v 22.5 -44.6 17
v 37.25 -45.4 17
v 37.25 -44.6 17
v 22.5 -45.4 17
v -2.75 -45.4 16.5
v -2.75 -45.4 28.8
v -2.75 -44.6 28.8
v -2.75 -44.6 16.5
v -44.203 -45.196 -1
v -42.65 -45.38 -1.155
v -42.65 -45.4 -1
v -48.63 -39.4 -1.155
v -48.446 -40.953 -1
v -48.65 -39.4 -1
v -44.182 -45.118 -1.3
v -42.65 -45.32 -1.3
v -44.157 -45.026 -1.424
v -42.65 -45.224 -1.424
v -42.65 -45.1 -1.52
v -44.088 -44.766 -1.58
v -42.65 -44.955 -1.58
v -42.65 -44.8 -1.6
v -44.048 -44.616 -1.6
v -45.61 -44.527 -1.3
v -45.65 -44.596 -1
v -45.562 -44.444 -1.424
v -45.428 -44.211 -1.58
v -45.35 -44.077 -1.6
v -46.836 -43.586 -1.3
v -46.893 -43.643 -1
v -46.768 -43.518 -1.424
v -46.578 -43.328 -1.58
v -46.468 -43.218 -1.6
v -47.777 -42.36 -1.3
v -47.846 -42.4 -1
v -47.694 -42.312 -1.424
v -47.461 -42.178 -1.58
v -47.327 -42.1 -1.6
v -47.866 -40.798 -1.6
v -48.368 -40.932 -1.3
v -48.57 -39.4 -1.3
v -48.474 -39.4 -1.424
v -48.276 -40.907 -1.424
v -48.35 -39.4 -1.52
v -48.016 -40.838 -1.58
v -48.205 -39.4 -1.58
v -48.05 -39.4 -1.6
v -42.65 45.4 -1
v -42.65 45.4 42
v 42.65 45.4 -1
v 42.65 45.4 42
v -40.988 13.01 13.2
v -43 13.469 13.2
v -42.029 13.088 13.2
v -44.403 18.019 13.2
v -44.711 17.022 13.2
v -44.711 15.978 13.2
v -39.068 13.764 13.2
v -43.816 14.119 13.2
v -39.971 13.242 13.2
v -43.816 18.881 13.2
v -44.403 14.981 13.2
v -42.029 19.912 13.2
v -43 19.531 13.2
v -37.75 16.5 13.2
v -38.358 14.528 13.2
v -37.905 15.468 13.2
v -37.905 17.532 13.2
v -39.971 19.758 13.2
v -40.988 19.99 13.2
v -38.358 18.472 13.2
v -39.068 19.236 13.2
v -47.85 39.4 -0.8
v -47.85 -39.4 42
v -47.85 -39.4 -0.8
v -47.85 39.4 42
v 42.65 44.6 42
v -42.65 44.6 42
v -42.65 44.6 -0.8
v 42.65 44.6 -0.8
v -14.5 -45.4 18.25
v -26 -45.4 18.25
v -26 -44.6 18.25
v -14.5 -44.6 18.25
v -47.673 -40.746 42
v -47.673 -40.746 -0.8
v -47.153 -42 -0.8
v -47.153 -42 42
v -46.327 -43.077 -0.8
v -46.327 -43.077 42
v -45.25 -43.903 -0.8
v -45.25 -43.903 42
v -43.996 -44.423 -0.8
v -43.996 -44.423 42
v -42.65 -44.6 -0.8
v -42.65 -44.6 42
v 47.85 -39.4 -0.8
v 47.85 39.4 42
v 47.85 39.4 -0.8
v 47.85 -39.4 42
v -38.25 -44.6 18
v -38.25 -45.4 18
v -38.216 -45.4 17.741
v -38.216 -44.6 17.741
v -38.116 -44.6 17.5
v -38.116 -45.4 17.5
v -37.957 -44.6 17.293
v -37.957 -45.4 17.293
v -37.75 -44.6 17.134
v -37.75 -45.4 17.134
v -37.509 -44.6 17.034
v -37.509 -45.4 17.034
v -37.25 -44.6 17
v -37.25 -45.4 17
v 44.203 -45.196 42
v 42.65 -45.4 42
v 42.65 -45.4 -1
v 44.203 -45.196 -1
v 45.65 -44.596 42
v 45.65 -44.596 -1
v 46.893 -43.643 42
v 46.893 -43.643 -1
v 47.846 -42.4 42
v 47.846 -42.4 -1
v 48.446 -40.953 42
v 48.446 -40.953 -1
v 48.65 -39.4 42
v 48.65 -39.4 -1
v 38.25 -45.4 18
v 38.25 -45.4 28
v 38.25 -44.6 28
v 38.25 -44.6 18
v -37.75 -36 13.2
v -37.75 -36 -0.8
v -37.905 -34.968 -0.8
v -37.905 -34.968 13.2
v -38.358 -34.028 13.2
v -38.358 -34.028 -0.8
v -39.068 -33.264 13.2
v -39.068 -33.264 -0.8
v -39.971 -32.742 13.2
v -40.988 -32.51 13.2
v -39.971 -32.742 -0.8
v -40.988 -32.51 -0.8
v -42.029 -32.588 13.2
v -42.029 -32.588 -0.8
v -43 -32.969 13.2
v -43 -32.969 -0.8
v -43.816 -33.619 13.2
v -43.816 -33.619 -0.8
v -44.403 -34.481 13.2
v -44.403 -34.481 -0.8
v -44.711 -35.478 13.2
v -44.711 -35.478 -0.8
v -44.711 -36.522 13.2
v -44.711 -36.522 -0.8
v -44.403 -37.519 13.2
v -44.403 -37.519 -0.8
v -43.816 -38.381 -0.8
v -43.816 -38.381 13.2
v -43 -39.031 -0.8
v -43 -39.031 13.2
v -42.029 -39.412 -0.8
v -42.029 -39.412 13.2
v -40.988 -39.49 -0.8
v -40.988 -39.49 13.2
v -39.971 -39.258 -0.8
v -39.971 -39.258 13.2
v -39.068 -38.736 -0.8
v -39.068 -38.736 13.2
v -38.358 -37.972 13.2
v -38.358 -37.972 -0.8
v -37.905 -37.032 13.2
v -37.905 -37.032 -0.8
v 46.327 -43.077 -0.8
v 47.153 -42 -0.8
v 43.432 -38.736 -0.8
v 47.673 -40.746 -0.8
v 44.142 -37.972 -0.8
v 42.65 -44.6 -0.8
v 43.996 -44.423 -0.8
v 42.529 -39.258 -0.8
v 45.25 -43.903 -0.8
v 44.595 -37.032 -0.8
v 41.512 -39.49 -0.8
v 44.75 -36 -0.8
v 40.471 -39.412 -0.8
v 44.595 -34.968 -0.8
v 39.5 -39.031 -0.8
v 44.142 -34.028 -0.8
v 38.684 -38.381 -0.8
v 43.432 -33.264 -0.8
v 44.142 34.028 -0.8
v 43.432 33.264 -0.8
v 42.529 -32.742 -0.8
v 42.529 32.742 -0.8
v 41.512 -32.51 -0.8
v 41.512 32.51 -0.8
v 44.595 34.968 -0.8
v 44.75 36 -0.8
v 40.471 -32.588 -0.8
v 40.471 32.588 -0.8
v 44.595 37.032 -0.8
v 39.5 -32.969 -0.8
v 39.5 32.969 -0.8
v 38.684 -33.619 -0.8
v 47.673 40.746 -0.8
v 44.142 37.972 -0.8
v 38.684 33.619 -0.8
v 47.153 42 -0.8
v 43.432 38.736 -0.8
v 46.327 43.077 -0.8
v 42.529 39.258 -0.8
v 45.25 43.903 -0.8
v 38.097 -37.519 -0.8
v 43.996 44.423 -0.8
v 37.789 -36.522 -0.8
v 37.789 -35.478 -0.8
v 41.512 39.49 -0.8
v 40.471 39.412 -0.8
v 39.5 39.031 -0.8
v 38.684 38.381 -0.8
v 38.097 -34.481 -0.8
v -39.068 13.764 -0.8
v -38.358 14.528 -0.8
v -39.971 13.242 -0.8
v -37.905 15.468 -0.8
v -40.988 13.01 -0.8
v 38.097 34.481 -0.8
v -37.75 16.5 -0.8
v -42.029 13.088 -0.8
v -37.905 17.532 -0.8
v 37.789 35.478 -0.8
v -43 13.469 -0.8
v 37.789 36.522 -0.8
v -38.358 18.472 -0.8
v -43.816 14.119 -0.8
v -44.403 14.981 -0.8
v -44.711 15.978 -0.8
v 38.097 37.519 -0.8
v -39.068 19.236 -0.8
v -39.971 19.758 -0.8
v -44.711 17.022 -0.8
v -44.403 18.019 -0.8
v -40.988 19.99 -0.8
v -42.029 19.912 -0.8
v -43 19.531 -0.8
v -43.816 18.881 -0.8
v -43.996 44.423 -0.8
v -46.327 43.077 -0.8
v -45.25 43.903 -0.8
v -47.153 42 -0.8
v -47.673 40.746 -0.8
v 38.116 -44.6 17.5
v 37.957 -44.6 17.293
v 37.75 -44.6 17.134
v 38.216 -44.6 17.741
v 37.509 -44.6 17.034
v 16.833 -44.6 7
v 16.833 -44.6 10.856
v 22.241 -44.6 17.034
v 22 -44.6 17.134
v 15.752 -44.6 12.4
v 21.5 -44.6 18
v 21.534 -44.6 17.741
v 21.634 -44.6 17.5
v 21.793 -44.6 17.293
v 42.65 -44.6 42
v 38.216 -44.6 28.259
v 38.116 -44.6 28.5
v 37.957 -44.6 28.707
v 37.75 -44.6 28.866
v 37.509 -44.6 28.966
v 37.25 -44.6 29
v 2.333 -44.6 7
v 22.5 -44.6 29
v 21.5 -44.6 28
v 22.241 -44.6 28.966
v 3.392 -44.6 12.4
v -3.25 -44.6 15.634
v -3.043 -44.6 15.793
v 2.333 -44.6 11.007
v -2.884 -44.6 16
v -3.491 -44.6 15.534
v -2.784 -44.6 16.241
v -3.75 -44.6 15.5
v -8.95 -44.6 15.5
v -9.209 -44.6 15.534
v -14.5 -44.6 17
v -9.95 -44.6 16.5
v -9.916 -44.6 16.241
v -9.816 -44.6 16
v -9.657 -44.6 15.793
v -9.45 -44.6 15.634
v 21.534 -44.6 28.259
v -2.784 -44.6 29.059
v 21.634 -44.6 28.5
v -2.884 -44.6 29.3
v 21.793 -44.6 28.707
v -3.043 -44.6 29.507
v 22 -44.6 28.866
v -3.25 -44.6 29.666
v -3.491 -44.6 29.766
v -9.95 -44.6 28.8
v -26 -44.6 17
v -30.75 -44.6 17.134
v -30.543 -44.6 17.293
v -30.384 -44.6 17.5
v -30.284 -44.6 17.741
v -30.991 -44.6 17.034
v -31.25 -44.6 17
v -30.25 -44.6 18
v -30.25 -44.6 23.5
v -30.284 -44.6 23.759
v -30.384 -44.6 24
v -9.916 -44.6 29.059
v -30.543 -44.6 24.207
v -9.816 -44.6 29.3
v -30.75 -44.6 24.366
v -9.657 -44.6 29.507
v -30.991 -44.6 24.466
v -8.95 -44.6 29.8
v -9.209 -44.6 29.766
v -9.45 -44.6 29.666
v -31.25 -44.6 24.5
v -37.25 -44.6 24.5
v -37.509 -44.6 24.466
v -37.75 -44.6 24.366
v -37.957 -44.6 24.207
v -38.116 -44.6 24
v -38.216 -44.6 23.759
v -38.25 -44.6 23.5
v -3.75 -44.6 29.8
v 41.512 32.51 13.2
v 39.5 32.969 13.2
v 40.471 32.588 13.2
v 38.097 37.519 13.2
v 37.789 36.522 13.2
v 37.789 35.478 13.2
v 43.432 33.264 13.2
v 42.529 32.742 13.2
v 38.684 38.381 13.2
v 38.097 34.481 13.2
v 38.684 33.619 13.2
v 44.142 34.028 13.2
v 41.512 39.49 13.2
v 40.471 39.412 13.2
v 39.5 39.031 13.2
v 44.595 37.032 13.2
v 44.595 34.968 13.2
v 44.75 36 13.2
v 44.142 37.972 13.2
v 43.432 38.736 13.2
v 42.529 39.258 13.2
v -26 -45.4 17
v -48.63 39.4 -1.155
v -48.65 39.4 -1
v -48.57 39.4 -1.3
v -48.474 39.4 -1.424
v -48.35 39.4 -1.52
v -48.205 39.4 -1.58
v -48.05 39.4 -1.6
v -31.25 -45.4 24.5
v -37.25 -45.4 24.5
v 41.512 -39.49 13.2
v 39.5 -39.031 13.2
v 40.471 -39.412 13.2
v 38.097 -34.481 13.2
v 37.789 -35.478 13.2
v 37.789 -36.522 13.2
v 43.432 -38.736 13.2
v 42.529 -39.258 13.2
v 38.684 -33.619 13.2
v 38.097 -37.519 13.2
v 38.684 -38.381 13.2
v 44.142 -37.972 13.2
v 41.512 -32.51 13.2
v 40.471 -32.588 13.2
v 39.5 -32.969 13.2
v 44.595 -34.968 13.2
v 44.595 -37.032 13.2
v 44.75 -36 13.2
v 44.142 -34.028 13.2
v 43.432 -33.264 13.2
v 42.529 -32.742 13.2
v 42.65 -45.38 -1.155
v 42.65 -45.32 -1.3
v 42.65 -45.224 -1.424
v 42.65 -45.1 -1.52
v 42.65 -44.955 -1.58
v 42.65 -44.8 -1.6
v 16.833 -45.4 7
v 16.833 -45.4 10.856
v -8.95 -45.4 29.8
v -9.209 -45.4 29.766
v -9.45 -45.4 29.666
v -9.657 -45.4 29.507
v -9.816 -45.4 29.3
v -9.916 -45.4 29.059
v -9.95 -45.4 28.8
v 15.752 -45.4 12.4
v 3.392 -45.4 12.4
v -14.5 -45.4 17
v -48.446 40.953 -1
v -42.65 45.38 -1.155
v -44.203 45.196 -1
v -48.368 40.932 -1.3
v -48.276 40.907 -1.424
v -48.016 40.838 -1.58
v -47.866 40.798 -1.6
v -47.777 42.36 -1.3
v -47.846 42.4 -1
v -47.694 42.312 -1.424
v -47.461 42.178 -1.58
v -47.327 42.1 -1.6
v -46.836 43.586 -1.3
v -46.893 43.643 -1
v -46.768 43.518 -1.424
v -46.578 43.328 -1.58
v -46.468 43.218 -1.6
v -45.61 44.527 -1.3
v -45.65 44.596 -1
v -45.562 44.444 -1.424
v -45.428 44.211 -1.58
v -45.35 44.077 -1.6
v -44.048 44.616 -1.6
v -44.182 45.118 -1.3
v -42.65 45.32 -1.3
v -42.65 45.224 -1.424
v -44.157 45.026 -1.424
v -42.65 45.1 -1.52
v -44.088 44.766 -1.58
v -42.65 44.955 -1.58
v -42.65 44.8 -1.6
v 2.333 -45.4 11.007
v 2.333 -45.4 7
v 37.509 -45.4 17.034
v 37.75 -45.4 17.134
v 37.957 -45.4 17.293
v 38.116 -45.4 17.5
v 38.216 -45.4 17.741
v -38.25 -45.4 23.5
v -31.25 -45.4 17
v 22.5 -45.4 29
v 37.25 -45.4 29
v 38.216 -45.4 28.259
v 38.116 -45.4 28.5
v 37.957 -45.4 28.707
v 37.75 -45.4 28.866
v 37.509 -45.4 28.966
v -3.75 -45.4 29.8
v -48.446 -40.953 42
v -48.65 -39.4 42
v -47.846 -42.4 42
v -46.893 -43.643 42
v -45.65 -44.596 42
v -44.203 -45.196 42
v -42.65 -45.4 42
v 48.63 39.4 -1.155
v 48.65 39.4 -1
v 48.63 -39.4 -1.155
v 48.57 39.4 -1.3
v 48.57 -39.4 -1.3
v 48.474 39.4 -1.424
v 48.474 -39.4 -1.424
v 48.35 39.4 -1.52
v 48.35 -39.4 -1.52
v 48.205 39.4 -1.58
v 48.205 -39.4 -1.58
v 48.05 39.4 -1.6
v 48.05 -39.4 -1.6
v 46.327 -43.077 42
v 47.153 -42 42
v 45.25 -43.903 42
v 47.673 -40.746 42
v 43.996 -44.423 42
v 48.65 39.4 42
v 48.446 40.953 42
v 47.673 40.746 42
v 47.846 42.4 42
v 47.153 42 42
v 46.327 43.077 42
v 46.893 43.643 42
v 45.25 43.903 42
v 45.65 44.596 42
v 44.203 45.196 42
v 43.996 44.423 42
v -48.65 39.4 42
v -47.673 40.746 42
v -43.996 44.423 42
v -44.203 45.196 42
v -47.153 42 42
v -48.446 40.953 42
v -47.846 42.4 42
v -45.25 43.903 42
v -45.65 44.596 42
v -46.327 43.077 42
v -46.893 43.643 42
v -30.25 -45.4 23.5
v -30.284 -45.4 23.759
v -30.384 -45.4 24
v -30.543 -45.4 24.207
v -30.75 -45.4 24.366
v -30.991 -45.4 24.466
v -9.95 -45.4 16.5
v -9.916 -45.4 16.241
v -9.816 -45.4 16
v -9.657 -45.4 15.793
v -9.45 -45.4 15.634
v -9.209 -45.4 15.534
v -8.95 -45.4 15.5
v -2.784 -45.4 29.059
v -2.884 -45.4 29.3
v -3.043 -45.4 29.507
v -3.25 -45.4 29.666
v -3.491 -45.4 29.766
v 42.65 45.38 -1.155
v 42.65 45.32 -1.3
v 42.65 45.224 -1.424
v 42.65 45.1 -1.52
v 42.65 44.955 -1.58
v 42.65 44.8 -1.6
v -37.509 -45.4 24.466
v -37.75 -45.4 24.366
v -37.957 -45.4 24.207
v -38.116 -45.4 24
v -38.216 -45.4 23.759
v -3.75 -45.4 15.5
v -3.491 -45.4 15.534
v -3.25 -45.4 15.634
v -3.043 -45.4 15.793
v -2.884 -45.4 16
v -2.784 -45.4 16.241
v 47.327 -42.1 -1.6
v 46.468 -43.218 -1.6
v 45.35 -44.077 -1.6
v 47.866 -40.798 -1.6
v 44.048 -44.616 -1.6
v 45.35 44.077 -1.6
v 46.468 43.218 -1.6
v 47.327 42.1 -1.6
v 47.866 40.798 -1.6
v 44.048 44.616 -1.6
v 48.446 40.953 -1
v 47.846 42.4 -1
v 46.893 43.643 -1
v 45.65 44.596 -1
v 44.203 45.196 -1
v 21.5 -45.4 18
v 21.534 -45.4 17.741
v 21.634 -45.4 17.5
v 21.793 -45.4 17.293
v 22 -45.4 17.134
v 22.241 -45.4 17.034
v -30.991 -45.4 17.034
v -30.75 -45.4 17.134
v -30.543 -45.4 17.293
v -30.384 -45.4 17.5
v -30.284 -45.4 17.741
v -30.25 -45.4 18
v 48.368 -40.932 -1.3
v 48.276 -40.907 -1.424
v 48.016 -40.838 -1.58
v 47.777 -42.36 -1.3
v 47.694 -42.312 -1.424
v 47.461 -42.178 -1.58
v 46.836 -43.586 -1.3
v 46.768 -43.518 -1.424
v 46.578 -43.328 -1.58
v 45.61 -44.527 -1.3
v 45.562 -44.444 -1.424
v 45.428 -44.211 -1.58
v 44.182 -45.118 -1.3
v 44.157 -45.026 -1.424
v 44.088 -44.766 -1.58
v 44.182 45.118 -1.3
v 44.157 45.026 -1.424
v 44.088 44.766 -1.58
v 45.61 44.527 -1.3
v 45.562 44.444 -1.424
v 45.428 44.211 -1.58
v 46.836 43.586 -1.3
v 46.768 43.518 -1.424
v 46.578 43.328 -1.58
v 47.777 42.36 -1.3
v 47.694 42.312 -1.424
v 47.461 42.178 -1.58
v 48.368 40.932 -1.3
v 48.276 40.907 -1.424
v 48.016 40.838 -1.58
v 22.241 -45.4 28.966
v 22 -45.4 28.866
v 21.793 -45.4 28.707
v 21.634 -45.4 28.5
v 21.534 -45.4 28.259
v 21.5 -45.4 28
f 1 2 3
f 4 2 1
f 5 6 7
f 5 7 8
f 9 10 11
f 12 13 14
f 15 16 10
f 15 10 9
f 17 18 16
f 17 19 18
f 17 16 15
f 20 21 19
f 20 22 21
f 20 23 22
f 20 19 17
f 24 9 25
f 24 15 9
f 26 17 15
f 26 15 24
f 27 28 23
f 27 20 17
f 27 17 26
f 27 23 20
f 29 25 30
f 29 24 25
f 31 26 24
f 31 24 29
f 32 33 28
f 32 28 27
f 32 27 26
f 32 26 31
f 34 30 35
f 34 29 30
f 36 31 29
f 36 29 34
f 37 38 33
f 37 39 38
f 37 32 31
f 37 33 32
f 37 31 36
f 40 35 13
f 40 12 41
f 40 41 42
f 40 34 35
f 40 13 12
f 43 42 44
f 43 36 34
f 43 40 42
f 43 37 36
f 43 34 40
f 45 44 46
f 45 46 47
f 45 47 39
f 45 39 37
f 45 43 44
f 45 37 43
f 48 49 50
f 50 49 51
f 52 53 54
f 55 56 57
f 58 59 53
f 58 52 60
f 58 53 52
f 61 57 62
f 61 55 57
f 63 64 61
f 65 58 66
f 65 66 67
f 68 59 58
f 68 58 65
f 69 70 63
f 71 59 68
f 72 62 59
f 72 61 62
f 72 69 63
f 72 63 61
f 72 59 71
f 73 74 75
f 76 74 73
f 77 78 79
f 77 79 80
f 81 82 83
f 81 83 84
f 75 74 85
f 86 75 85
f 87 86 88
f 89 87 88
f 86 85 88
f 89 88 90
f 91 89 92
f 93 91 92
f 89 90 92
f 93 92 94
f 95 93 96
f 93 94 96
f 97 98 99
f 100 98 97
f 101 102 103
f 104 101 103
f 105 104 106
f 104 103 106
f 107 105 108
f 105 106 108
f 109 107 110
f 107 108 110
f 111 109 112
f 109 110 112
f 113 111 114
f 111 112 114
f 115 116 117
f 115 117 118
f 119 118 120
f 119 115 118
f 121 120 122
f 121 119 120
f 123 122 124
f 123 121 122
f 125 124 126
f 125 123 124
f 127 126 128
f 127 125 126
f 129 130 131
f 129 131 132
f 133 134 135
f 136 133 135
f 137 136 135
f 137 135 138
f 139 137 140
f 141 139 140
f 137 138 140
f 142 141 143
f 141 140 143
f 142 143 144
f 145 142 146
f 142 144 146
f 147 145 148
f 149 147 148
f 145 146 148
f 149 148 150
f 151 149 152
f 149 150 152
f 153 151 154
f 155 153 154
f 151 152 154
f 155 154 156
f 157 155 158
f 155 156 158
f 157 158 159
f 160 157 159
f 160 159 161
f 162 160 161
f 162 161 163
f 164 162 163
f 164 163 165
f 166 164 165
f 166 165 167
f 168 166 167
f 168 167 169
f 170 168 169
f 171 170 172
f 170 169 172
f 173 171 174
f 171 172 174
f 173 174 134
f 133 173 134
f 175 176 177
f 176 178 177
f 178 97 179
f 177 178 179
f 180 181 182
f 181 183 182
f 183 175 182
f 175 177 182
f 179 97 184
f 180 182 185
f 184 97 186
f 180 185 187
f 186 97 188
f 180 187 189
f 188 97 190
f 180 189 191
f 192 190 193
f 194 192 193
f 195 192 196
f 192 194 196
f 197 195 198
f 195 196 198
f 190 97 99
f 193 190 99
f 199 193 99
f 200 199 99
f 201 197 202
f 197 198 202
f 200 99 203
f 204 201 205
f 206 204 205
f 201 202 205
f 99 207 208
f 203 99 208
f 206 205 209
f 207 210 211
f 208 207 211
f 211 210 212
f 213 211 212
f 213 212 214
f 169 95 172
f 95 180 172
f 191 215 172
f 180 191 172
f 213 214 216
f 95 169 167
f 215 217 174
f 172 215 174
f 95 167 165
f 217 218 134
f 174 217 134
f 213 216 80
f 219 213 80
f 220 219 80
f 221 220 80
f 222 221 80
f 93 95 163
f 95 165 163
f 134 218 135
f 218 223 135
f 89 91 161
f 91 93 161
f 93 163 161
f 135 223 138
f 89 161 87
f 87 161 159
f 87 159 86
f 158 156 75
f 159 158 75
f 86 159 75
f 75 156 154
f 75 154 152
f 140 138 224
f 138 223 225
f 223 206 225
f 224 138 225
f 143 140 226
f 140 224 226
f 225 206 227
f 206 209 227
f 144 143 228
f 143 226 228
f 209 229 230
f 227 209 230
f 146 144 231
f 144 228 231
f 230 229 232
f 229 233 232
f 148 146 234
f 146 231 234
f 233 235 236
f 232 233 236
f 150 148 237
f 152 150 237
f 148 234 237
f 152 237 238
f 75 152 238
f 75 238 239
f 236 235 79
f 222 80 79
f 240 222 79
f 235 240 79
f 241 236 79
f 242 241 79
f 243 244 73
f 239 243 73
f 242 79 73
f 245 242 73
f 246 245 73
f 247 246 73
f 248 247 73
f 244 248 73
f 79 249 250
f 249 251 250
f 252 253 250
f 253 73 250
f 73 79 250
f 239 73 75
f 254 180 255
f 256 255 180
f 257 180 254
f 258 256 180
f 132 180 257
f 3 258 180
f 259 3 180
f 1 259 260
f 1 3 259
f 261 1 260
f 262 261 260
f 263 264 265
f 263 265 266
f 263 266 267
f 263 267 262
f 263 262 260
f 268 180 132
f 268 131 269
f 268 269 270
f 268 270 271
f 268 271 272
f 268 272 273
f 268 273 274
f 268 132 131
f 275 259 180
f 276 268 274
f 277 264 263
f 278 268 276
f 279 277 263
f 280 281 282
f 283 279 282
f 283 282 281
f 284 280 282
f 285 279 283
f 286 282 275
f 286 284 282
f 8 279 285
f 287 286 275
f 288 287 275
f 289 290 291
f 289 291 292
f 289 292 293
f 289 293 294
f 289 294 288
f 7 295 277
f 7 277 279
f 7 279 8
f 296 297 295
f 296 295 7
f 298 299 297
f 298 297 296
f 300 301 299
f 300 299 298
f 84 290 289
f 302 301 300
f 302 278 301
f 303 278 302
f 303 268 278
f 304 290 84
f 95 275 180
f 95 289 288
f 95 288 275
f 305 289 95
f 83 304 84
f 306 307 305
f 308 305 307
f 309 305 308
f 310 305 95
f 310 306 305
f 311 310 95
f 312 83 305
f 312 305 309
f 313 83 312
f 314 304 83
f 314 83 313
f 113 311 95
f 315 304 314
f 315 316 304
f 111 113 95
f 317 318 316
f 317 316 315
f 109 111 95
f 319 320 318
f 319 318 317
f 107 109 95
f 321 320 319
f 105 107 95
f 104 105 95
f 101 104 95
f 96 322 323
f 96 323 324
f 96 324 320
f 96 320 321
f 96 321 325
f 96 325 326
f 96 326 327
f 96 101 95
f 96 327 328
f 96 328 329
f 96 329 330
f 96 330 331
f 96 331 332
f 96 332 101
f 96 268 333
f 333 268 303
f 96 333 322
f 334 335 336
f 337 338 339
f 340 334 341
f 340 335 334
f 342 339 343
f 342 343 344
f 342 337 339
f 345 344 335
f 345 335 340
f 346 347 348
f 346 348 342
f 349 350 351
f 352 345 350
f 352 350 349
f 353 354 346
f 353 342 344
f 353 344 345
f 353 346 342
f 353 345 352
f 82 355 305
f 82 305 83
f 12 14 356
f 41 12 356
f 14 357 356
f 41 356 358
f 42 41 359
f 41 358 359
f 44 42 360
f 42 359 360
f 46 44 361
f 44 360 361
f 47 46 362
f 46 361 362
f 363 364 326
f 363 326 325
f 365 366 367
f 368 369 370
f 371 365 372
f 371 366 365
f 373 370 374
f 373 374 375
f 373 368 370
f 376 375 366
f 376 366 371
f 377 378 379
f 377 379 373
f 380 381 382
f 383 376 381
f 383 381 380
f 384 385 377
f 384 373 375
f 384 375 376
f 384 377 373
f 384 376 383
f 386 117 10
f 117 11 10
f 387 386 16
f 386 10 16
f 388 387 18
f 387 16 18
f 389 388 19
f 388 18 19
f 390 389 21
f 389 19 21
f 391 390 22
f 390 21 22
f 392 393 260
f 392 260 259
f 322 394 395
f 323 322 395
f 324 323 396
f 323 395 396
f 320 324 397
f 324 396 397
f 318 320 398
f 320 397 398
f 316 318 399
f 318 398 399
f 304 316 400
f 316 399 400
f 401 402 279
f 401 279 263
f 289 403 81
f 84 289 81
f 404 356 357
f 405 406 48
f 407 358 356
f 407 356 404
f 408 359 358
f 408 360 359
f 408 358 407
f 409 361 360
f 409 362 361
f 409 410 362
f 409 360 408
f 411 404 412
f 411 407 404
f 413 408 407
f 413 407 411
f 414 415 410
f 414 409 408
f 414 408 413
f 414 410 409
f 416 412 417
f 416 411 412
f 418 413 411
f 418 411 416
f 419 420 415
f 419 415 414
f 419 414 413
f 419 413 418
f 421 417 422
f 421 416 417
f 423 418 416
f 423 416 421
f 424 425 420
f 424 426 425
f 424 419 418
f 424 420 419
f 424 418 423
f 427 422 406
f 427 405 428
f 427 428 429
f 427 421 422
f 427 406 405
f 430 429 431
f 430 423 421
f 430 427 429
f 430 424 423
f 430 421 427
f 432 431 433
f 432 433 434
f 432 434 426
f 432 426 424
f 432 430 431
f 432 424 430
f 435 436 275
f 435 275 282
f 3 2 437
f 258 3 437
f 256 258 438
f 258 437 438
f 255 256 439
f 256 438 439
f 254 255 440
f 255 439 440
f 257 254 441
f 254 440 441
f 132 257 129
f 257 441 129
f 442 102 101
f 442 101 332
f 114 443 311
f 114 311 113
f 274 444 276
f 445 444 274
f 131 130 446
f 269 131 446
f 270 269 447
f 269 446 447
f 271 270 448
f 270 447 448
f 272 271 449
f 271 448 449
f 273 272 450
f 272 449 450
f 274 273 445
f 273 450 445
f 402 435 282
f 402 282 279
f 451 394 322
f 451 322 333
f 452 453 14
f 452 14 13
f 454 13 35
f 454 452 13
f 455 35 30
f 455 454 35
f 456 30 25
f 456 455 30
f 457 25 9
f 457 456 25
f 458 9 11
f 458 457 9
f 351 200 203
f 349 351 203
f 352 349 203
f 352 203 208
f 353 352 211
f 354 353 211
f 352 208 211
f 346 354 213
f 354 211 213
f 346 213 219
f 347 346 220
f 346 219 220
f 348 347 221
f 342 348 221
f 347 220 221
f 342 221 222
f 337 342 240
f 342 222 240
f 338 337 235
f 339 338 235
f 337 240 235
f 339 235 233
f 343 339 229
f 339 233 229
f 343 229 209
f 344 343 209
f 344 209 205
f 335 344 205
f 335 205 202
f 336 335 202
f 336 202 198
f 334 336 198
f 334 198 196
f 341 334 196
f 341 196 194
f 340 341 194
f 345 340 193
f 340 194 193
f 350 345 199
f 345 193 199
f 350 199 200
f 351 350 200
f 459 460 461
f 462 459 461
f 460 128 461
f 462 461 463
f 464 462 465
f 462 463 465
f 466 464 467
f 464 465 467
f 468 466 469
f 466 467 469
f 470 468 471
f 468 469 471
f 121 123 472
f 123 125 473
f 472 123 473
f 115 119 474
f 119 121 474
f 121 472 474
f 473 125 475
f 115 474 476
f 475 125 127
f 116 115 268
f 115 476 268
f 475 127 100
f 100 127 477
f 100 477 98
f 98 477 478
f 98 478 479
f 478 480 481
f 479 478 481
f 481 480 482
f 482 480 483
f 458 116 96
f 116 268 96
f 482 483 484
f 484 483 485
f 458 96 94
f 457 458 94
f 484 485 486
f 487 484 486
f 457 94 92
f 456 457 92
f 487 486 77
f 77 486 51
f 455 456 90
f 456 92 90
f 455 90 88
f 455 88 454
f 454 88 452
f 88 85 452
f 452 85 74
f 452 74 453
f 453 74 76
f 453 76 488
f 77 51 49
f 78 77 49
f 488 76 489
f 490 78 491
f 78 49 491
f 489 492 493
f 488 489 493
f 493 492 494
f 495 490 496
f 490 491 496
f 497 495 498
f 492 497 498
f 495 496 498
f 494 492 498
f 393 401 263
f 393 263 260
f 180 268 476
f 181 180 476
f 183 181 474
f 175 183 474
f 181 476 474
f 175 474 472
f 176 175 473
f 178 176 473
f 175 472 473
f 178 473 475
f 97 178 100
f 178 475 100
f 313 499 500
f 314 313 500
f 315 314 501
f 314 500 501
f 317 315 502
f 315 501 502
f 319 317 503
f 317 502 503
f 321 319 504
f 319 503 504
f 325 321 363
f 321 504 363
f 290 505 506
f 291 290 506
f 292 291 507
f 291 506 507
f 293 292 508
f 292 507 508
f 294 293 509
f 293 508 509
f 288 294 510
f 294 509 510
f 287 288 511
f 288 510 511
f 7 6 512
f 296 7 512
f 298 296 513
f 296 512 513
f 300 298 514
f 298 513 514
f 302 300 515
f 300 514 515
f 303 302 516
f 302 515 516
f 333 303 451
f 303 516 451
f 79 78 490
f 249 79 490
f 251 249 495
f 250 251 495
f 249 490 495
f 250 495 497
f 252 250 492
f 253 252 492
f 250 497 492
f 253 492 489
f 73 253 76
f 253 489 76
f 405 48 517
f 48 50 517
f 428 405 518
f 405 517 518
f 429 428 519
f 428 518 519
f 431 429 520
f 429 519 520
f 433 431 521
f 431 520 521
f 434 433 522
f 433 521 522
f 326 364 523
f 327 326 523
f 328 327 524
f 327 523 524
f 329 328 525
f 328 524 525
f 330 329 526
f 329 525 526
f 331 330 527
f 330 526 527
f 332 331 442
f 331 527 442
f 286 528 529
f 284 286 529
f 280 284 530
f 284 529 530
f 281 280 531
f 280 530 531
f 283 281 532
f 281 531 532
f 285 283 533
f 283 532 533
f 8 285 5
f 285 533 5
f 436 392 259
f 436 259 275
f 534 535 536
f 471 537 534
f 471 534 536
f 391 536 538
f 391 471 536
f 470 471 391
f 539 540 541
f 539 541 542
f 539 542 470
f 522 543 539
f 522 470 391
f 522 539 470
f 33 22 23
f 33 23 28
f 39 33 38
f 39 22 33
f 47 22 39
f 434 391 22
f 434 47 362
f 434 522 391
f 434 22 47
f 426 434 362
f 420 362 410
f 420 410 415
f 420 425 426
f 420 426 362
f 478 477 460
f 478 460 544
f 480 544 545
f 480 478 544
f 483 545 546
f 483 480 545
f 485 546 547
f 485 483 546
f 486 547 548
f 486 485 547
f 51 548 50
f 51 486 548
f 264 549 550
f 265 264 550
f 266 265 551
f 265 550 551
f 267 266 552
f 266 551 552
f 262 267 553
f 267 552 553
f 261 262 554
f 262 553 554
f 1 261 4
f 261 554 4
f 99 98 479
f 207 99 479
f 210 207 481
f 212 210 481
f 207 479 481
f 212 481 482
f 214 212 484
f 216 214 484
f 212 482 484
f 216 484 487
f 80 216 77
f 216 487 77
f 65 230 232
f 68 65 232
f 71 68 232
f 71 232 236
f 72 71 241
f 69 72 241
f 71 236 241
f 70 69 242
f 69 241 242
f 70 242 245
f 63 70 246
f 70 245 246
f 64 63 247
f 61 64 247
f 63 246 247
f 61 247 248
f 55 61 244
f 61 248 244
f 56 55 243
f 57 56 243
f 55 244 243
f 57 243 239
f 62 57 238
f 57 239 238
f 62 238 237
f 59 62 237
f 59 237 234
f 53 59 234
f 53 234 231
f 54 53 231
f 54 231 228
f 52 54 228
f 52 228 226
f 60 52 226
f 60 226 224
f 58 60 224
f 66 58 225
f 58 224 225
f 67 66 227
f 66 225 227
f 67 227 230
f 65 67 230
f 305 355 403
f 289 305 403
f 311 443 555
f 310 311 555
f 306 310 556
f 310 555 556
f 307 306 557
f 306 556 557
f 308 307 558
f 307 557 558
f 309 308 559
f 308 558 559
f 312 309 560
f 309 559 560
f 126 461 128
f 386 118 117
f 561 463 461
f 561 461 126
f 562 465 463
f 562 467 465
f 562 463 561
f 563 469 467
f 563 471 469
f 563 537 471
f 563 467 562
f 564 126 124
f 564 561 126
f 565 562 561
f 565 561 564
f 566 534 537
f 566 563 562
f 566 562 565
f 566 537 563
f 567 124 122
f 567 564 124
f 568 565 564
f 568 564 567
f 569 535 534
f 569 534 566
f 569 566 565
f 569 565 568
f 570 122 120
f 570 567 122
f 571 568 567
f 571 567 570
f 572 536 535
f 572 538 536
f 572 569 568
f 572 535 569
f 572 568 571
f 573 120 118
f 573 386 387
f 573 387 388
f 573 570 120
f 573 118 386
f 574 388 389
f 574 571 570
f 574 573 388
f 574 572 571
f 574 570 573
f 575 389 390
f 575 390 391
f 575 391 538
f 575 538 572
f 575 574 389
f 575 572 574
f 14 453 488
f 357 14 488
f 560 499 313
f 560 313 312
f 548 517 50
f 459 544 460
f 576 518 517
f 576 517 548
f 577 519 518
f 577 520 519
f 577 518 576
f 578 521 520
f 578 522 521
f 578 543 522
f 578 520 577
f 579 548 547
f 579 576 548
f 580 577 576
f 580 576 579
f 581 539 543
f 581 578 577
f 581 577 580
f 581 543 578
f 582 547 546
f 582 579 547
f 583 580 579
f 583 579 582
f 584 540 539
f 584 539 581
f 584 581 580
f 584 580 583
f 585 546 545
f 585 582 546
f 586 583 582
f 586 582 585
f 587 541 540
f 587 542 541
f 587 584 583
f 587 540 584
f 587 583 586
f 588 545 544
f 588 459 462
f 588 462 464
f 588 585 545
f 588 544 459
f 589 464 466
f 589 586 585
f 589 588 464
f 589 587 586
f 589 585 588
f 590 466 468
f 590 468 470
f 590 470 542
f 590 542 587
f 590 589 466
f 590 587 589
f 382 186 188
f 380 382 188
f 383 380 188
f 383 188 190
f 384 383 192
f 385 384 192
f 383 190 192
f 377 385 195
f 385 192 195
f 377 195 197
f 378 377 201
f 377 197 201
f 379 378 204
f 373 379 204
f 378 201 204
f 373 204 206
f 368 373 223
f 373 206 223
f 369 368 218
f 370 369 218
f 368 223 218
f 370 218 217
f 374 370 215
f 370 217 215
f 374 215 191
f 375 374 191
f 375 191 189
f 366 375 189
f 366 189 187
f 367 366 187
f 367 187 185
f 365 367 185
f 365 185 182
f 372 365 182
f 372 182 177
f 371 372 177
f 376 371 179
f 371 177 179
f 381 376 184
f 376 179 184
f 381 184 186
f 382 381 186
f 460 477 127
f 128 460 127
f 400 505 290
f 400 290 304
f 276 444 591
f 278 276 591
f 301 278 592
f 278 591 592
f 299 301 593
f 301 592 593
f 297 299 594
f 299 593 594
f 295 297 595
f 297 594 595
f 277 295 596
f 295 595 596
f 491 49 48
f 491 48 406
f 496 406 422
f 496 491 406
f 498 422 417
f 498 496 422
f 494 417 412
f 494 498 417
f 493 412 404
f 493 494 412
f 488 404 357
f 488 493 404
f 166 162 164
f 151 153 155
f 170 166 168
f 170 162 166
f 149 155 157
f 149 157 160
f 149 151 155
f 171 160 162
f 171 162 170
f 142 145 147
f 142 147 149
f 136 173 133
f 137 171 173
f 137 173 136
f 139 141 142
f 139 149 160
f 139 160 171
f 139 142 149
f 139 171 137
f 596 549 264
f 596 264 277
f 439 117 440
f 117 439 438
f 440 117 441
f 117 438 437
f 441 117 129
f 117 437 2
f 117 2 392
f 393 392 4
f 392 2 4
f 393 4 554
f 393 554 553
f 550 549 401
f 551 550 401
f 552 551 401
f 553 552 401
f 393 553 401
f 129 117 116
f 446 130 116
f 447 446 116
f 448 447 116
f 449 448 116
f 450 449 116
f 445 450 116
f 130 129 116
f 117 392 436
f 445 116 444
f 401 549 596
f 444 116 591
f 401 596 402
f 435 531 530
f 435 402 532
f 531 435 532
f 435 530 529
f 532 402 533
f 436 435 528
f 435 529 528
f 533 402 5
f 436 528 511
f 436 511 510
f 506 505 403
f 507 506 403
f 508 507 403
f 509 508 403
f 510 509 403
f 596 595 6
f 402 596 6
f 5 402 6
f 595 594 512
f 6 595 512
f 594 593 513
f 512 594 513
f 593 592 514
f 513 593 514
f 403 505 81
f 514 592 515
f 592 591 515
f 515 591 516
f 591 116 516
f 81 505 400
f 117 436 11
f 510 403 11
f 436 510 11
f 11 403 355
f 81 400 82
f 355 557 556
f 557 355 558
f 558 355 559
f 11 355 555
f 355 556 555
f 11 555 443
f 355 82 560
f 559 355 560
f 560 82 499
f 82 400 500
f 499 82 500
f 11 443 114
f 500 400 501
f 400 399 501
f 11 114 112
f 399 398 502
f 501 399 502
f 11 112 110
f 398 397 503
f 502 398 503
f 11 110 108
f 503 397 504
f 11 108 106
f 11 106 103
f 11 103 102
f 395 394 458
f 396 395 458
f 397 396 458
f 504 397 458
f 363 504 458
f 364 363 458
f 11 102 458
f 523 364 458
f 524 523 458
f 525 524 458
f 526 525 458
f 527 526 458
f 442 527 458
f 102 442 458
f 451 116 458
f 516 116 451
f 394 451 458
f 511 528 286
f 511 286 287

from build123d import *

# Parameters (mm, degrees)
SKETCH004_W    = 11.5
SKETCH004_H    = 1.25
PAD003_DEPTH   = 3.2
PAD_DEPTH      = 42
PAD_DEPTH_BACK = 1.6
THICKNESS_T    = -0.8
SKETCH002_R    = 1.75
PAD001_DEPTH   = 13
SKETCH003_R    = 3.5
PAD002_DEPTH   = 14
FILLET_R       = 0.6


with BuildPart() as pad003:
    # Sketch004 → Pad003 (new body)
    with BuildSketch(Plane.XZ.offset(46.2)):
        with BuildLine():
            Line((22.5, 29), (37.25, 29))
            ThreePointArc((38.25, 28), (37.957107, 28.707107), (37.25, 29))
            Line((38.25, 28), (38.25, 18))
            ThreePointArc((37.25, 17), (37.957107, 17.292893), (38.25, 18))
            Line((37.25, 17), (22.5, 17))
            ThreePointArc((21.5, 18), (21.792893, 17.292893), (22.5, 17))
            Line((21.5, 18), (21.5, 28))
            ThreePointArc((22.5, 29), (21.792893, 28.707107), (21.5, 28))
        make_face()
        with BuildLine():
            Line((-8.95, 29.8), (-3.75, 29.8))
            ThreePointArc((-2.75, 28.8), (-3.042893, 29.507107), (-3.75, 29.8))
            Line((-2.75, 28.8), (-2.75, 16.5))
            ThreePointArc((-3.75, 15.5), (-3.042893, 15.792893), (-2.75, 16.5))
            Line((-3.75, 15.5), (-8.95, 15.5))
            ThreePointArc((-9.95, 16.5), (-9.657107, 15.792893), (-8.95, 15.5))
            Line((-9.95, 16.5), (-9.95, 28.8))
            ThreePointArc((-8.95, 29.8), (-9.657107, 29.507107), (-9.95, 28.8))
        make_face()
        with BuildLine():
            Line((-37.25, 24.5), (-31.25, 24.5))
            ThreePointArc((-30.25, 23.5), (-30.542893, 24.207107), (-31.25, 24.5))
            Line((-30.25, 23.5), (-30.25, 18))
            ThreePointArc((-31.25, 17), (-30.542893, 17.292893), (-30.25, 18))
            Line((-31.25, 17), (-37.25, 17))
            ThreePointArc((-38.25, 18), (-37.957107, 17.292893), (-37.25, 17))
            Line((-38.25, 18), (-38.25, 23.5))
            ThreePointArc((-37.25, 24.5), (-37.957107, 24.207107), (-38.25, 23.5))
        make_face()
        with Locations((-20.25, 17.625)):
            Rectangle(SKETCH004_W, SKETCH004_H)
        Polygon((2.333401, 7), (2.333401, 11.006851), (3.391764, 12.4), (15.751917, 12.4), (16.833401, 10.855655), (16.833401, 7), align=None)
    extrude(amount=-PAD003_DEPTH)


with BuildPart() as fillet_body:
    # Sketch001 → Pad (new body, two sides)
    with BuildSketch(Plane.XY) as pad_sk:
        with BuildLine():
            Line((-42.65, 45.4), (42.65, 45.4))
            ThreePointArc((48.65, 39.4), (46.892641, 43.642641), (42.65, 45.4))
            Line((48.65, 39.4), (48.65, -39.4))
            ThreePointArc((42.65, -45.4), (46.892641, -43.642641), (48.65, -39.4))
            Line((42.65, -45.4), (-42.65, -45.4))
            ThreePointArc((-48.65, -39.4), (-46.892641, -43.642641), (-42.65, -45.4))
            Line((-48.65, -39.4), (-48.65, 39.4))
            ThreePointArc((-42.65, 45.4), (-46.892641, 43.642641), (-48.65, 39.4))
        make_face()
    extrude(amount=PAD_DEPTH)
    extrude(pad_sk.sketch, amount=-PAD_DEPTH_BACK)

    # Thickness
    thickness_openings = [fillet_body.faces().sort_by_distance(p)[0] for p in [
        (0, 0, 42),
    ]]
    offset(amount=THICKNESS_T, openings=thickness_openings)

    # Sketch002 → Pad001 (new body)
    with BuildSketch(Plane.XY.offset(-0.8)):
        with Locations((-41.25, -36)):
            Circle(SKETCH002_R)
        with Locations((41.25, -36)):
            Circle(SKETCH002_R)
        with Locations((-41.25, 16.5)):
            Circle(SKETCH002_R)
        with Locations((41.25, 36)):
            Circle(SKETCH002_R)
    extrude(amount=PAD001_DEPTH)

    # Sketch003 → Pad002 (new body)
    with BuildSketch(Plane.XY.offset(-0.8)):
        with Locations((41.25, -36)):
            Circle(SKETCH003_R)
        with Locations((41.25, 36)):
            Circle(SKETCH003_R)
        with Locations((-41.25, 16.5)):
            Circle(SKETCH003_R)
        with Locations((-41.25, -36)):
            Circle(SKETCH003_R)
    extrude(amount=PAD002_DEPTH)

    # Cut: cut Pad003
    add(pad003.part, mode=Mode.SUBTRACT)

    # Fillet
    fillet_edges = [fillet_body.edges().sort_by_distance(p)[0] for p in [
        (0, 45.4, -1.6),
        (46.892641, 43.642641, -1.6),
        (48.65, 0, -1.6),
        (46.892641, -43.642641, -1.6),
        (0, -45.4, -1.6),
        (-46.892641, -43.642641, -1.6),
        (-48.65, 0, -1.6),
        (-46.892641, 43.642641, -1.6),
    ]]
    fillet(fillet_edges, radius=FILLET_R)


solid = fillet_body.part
